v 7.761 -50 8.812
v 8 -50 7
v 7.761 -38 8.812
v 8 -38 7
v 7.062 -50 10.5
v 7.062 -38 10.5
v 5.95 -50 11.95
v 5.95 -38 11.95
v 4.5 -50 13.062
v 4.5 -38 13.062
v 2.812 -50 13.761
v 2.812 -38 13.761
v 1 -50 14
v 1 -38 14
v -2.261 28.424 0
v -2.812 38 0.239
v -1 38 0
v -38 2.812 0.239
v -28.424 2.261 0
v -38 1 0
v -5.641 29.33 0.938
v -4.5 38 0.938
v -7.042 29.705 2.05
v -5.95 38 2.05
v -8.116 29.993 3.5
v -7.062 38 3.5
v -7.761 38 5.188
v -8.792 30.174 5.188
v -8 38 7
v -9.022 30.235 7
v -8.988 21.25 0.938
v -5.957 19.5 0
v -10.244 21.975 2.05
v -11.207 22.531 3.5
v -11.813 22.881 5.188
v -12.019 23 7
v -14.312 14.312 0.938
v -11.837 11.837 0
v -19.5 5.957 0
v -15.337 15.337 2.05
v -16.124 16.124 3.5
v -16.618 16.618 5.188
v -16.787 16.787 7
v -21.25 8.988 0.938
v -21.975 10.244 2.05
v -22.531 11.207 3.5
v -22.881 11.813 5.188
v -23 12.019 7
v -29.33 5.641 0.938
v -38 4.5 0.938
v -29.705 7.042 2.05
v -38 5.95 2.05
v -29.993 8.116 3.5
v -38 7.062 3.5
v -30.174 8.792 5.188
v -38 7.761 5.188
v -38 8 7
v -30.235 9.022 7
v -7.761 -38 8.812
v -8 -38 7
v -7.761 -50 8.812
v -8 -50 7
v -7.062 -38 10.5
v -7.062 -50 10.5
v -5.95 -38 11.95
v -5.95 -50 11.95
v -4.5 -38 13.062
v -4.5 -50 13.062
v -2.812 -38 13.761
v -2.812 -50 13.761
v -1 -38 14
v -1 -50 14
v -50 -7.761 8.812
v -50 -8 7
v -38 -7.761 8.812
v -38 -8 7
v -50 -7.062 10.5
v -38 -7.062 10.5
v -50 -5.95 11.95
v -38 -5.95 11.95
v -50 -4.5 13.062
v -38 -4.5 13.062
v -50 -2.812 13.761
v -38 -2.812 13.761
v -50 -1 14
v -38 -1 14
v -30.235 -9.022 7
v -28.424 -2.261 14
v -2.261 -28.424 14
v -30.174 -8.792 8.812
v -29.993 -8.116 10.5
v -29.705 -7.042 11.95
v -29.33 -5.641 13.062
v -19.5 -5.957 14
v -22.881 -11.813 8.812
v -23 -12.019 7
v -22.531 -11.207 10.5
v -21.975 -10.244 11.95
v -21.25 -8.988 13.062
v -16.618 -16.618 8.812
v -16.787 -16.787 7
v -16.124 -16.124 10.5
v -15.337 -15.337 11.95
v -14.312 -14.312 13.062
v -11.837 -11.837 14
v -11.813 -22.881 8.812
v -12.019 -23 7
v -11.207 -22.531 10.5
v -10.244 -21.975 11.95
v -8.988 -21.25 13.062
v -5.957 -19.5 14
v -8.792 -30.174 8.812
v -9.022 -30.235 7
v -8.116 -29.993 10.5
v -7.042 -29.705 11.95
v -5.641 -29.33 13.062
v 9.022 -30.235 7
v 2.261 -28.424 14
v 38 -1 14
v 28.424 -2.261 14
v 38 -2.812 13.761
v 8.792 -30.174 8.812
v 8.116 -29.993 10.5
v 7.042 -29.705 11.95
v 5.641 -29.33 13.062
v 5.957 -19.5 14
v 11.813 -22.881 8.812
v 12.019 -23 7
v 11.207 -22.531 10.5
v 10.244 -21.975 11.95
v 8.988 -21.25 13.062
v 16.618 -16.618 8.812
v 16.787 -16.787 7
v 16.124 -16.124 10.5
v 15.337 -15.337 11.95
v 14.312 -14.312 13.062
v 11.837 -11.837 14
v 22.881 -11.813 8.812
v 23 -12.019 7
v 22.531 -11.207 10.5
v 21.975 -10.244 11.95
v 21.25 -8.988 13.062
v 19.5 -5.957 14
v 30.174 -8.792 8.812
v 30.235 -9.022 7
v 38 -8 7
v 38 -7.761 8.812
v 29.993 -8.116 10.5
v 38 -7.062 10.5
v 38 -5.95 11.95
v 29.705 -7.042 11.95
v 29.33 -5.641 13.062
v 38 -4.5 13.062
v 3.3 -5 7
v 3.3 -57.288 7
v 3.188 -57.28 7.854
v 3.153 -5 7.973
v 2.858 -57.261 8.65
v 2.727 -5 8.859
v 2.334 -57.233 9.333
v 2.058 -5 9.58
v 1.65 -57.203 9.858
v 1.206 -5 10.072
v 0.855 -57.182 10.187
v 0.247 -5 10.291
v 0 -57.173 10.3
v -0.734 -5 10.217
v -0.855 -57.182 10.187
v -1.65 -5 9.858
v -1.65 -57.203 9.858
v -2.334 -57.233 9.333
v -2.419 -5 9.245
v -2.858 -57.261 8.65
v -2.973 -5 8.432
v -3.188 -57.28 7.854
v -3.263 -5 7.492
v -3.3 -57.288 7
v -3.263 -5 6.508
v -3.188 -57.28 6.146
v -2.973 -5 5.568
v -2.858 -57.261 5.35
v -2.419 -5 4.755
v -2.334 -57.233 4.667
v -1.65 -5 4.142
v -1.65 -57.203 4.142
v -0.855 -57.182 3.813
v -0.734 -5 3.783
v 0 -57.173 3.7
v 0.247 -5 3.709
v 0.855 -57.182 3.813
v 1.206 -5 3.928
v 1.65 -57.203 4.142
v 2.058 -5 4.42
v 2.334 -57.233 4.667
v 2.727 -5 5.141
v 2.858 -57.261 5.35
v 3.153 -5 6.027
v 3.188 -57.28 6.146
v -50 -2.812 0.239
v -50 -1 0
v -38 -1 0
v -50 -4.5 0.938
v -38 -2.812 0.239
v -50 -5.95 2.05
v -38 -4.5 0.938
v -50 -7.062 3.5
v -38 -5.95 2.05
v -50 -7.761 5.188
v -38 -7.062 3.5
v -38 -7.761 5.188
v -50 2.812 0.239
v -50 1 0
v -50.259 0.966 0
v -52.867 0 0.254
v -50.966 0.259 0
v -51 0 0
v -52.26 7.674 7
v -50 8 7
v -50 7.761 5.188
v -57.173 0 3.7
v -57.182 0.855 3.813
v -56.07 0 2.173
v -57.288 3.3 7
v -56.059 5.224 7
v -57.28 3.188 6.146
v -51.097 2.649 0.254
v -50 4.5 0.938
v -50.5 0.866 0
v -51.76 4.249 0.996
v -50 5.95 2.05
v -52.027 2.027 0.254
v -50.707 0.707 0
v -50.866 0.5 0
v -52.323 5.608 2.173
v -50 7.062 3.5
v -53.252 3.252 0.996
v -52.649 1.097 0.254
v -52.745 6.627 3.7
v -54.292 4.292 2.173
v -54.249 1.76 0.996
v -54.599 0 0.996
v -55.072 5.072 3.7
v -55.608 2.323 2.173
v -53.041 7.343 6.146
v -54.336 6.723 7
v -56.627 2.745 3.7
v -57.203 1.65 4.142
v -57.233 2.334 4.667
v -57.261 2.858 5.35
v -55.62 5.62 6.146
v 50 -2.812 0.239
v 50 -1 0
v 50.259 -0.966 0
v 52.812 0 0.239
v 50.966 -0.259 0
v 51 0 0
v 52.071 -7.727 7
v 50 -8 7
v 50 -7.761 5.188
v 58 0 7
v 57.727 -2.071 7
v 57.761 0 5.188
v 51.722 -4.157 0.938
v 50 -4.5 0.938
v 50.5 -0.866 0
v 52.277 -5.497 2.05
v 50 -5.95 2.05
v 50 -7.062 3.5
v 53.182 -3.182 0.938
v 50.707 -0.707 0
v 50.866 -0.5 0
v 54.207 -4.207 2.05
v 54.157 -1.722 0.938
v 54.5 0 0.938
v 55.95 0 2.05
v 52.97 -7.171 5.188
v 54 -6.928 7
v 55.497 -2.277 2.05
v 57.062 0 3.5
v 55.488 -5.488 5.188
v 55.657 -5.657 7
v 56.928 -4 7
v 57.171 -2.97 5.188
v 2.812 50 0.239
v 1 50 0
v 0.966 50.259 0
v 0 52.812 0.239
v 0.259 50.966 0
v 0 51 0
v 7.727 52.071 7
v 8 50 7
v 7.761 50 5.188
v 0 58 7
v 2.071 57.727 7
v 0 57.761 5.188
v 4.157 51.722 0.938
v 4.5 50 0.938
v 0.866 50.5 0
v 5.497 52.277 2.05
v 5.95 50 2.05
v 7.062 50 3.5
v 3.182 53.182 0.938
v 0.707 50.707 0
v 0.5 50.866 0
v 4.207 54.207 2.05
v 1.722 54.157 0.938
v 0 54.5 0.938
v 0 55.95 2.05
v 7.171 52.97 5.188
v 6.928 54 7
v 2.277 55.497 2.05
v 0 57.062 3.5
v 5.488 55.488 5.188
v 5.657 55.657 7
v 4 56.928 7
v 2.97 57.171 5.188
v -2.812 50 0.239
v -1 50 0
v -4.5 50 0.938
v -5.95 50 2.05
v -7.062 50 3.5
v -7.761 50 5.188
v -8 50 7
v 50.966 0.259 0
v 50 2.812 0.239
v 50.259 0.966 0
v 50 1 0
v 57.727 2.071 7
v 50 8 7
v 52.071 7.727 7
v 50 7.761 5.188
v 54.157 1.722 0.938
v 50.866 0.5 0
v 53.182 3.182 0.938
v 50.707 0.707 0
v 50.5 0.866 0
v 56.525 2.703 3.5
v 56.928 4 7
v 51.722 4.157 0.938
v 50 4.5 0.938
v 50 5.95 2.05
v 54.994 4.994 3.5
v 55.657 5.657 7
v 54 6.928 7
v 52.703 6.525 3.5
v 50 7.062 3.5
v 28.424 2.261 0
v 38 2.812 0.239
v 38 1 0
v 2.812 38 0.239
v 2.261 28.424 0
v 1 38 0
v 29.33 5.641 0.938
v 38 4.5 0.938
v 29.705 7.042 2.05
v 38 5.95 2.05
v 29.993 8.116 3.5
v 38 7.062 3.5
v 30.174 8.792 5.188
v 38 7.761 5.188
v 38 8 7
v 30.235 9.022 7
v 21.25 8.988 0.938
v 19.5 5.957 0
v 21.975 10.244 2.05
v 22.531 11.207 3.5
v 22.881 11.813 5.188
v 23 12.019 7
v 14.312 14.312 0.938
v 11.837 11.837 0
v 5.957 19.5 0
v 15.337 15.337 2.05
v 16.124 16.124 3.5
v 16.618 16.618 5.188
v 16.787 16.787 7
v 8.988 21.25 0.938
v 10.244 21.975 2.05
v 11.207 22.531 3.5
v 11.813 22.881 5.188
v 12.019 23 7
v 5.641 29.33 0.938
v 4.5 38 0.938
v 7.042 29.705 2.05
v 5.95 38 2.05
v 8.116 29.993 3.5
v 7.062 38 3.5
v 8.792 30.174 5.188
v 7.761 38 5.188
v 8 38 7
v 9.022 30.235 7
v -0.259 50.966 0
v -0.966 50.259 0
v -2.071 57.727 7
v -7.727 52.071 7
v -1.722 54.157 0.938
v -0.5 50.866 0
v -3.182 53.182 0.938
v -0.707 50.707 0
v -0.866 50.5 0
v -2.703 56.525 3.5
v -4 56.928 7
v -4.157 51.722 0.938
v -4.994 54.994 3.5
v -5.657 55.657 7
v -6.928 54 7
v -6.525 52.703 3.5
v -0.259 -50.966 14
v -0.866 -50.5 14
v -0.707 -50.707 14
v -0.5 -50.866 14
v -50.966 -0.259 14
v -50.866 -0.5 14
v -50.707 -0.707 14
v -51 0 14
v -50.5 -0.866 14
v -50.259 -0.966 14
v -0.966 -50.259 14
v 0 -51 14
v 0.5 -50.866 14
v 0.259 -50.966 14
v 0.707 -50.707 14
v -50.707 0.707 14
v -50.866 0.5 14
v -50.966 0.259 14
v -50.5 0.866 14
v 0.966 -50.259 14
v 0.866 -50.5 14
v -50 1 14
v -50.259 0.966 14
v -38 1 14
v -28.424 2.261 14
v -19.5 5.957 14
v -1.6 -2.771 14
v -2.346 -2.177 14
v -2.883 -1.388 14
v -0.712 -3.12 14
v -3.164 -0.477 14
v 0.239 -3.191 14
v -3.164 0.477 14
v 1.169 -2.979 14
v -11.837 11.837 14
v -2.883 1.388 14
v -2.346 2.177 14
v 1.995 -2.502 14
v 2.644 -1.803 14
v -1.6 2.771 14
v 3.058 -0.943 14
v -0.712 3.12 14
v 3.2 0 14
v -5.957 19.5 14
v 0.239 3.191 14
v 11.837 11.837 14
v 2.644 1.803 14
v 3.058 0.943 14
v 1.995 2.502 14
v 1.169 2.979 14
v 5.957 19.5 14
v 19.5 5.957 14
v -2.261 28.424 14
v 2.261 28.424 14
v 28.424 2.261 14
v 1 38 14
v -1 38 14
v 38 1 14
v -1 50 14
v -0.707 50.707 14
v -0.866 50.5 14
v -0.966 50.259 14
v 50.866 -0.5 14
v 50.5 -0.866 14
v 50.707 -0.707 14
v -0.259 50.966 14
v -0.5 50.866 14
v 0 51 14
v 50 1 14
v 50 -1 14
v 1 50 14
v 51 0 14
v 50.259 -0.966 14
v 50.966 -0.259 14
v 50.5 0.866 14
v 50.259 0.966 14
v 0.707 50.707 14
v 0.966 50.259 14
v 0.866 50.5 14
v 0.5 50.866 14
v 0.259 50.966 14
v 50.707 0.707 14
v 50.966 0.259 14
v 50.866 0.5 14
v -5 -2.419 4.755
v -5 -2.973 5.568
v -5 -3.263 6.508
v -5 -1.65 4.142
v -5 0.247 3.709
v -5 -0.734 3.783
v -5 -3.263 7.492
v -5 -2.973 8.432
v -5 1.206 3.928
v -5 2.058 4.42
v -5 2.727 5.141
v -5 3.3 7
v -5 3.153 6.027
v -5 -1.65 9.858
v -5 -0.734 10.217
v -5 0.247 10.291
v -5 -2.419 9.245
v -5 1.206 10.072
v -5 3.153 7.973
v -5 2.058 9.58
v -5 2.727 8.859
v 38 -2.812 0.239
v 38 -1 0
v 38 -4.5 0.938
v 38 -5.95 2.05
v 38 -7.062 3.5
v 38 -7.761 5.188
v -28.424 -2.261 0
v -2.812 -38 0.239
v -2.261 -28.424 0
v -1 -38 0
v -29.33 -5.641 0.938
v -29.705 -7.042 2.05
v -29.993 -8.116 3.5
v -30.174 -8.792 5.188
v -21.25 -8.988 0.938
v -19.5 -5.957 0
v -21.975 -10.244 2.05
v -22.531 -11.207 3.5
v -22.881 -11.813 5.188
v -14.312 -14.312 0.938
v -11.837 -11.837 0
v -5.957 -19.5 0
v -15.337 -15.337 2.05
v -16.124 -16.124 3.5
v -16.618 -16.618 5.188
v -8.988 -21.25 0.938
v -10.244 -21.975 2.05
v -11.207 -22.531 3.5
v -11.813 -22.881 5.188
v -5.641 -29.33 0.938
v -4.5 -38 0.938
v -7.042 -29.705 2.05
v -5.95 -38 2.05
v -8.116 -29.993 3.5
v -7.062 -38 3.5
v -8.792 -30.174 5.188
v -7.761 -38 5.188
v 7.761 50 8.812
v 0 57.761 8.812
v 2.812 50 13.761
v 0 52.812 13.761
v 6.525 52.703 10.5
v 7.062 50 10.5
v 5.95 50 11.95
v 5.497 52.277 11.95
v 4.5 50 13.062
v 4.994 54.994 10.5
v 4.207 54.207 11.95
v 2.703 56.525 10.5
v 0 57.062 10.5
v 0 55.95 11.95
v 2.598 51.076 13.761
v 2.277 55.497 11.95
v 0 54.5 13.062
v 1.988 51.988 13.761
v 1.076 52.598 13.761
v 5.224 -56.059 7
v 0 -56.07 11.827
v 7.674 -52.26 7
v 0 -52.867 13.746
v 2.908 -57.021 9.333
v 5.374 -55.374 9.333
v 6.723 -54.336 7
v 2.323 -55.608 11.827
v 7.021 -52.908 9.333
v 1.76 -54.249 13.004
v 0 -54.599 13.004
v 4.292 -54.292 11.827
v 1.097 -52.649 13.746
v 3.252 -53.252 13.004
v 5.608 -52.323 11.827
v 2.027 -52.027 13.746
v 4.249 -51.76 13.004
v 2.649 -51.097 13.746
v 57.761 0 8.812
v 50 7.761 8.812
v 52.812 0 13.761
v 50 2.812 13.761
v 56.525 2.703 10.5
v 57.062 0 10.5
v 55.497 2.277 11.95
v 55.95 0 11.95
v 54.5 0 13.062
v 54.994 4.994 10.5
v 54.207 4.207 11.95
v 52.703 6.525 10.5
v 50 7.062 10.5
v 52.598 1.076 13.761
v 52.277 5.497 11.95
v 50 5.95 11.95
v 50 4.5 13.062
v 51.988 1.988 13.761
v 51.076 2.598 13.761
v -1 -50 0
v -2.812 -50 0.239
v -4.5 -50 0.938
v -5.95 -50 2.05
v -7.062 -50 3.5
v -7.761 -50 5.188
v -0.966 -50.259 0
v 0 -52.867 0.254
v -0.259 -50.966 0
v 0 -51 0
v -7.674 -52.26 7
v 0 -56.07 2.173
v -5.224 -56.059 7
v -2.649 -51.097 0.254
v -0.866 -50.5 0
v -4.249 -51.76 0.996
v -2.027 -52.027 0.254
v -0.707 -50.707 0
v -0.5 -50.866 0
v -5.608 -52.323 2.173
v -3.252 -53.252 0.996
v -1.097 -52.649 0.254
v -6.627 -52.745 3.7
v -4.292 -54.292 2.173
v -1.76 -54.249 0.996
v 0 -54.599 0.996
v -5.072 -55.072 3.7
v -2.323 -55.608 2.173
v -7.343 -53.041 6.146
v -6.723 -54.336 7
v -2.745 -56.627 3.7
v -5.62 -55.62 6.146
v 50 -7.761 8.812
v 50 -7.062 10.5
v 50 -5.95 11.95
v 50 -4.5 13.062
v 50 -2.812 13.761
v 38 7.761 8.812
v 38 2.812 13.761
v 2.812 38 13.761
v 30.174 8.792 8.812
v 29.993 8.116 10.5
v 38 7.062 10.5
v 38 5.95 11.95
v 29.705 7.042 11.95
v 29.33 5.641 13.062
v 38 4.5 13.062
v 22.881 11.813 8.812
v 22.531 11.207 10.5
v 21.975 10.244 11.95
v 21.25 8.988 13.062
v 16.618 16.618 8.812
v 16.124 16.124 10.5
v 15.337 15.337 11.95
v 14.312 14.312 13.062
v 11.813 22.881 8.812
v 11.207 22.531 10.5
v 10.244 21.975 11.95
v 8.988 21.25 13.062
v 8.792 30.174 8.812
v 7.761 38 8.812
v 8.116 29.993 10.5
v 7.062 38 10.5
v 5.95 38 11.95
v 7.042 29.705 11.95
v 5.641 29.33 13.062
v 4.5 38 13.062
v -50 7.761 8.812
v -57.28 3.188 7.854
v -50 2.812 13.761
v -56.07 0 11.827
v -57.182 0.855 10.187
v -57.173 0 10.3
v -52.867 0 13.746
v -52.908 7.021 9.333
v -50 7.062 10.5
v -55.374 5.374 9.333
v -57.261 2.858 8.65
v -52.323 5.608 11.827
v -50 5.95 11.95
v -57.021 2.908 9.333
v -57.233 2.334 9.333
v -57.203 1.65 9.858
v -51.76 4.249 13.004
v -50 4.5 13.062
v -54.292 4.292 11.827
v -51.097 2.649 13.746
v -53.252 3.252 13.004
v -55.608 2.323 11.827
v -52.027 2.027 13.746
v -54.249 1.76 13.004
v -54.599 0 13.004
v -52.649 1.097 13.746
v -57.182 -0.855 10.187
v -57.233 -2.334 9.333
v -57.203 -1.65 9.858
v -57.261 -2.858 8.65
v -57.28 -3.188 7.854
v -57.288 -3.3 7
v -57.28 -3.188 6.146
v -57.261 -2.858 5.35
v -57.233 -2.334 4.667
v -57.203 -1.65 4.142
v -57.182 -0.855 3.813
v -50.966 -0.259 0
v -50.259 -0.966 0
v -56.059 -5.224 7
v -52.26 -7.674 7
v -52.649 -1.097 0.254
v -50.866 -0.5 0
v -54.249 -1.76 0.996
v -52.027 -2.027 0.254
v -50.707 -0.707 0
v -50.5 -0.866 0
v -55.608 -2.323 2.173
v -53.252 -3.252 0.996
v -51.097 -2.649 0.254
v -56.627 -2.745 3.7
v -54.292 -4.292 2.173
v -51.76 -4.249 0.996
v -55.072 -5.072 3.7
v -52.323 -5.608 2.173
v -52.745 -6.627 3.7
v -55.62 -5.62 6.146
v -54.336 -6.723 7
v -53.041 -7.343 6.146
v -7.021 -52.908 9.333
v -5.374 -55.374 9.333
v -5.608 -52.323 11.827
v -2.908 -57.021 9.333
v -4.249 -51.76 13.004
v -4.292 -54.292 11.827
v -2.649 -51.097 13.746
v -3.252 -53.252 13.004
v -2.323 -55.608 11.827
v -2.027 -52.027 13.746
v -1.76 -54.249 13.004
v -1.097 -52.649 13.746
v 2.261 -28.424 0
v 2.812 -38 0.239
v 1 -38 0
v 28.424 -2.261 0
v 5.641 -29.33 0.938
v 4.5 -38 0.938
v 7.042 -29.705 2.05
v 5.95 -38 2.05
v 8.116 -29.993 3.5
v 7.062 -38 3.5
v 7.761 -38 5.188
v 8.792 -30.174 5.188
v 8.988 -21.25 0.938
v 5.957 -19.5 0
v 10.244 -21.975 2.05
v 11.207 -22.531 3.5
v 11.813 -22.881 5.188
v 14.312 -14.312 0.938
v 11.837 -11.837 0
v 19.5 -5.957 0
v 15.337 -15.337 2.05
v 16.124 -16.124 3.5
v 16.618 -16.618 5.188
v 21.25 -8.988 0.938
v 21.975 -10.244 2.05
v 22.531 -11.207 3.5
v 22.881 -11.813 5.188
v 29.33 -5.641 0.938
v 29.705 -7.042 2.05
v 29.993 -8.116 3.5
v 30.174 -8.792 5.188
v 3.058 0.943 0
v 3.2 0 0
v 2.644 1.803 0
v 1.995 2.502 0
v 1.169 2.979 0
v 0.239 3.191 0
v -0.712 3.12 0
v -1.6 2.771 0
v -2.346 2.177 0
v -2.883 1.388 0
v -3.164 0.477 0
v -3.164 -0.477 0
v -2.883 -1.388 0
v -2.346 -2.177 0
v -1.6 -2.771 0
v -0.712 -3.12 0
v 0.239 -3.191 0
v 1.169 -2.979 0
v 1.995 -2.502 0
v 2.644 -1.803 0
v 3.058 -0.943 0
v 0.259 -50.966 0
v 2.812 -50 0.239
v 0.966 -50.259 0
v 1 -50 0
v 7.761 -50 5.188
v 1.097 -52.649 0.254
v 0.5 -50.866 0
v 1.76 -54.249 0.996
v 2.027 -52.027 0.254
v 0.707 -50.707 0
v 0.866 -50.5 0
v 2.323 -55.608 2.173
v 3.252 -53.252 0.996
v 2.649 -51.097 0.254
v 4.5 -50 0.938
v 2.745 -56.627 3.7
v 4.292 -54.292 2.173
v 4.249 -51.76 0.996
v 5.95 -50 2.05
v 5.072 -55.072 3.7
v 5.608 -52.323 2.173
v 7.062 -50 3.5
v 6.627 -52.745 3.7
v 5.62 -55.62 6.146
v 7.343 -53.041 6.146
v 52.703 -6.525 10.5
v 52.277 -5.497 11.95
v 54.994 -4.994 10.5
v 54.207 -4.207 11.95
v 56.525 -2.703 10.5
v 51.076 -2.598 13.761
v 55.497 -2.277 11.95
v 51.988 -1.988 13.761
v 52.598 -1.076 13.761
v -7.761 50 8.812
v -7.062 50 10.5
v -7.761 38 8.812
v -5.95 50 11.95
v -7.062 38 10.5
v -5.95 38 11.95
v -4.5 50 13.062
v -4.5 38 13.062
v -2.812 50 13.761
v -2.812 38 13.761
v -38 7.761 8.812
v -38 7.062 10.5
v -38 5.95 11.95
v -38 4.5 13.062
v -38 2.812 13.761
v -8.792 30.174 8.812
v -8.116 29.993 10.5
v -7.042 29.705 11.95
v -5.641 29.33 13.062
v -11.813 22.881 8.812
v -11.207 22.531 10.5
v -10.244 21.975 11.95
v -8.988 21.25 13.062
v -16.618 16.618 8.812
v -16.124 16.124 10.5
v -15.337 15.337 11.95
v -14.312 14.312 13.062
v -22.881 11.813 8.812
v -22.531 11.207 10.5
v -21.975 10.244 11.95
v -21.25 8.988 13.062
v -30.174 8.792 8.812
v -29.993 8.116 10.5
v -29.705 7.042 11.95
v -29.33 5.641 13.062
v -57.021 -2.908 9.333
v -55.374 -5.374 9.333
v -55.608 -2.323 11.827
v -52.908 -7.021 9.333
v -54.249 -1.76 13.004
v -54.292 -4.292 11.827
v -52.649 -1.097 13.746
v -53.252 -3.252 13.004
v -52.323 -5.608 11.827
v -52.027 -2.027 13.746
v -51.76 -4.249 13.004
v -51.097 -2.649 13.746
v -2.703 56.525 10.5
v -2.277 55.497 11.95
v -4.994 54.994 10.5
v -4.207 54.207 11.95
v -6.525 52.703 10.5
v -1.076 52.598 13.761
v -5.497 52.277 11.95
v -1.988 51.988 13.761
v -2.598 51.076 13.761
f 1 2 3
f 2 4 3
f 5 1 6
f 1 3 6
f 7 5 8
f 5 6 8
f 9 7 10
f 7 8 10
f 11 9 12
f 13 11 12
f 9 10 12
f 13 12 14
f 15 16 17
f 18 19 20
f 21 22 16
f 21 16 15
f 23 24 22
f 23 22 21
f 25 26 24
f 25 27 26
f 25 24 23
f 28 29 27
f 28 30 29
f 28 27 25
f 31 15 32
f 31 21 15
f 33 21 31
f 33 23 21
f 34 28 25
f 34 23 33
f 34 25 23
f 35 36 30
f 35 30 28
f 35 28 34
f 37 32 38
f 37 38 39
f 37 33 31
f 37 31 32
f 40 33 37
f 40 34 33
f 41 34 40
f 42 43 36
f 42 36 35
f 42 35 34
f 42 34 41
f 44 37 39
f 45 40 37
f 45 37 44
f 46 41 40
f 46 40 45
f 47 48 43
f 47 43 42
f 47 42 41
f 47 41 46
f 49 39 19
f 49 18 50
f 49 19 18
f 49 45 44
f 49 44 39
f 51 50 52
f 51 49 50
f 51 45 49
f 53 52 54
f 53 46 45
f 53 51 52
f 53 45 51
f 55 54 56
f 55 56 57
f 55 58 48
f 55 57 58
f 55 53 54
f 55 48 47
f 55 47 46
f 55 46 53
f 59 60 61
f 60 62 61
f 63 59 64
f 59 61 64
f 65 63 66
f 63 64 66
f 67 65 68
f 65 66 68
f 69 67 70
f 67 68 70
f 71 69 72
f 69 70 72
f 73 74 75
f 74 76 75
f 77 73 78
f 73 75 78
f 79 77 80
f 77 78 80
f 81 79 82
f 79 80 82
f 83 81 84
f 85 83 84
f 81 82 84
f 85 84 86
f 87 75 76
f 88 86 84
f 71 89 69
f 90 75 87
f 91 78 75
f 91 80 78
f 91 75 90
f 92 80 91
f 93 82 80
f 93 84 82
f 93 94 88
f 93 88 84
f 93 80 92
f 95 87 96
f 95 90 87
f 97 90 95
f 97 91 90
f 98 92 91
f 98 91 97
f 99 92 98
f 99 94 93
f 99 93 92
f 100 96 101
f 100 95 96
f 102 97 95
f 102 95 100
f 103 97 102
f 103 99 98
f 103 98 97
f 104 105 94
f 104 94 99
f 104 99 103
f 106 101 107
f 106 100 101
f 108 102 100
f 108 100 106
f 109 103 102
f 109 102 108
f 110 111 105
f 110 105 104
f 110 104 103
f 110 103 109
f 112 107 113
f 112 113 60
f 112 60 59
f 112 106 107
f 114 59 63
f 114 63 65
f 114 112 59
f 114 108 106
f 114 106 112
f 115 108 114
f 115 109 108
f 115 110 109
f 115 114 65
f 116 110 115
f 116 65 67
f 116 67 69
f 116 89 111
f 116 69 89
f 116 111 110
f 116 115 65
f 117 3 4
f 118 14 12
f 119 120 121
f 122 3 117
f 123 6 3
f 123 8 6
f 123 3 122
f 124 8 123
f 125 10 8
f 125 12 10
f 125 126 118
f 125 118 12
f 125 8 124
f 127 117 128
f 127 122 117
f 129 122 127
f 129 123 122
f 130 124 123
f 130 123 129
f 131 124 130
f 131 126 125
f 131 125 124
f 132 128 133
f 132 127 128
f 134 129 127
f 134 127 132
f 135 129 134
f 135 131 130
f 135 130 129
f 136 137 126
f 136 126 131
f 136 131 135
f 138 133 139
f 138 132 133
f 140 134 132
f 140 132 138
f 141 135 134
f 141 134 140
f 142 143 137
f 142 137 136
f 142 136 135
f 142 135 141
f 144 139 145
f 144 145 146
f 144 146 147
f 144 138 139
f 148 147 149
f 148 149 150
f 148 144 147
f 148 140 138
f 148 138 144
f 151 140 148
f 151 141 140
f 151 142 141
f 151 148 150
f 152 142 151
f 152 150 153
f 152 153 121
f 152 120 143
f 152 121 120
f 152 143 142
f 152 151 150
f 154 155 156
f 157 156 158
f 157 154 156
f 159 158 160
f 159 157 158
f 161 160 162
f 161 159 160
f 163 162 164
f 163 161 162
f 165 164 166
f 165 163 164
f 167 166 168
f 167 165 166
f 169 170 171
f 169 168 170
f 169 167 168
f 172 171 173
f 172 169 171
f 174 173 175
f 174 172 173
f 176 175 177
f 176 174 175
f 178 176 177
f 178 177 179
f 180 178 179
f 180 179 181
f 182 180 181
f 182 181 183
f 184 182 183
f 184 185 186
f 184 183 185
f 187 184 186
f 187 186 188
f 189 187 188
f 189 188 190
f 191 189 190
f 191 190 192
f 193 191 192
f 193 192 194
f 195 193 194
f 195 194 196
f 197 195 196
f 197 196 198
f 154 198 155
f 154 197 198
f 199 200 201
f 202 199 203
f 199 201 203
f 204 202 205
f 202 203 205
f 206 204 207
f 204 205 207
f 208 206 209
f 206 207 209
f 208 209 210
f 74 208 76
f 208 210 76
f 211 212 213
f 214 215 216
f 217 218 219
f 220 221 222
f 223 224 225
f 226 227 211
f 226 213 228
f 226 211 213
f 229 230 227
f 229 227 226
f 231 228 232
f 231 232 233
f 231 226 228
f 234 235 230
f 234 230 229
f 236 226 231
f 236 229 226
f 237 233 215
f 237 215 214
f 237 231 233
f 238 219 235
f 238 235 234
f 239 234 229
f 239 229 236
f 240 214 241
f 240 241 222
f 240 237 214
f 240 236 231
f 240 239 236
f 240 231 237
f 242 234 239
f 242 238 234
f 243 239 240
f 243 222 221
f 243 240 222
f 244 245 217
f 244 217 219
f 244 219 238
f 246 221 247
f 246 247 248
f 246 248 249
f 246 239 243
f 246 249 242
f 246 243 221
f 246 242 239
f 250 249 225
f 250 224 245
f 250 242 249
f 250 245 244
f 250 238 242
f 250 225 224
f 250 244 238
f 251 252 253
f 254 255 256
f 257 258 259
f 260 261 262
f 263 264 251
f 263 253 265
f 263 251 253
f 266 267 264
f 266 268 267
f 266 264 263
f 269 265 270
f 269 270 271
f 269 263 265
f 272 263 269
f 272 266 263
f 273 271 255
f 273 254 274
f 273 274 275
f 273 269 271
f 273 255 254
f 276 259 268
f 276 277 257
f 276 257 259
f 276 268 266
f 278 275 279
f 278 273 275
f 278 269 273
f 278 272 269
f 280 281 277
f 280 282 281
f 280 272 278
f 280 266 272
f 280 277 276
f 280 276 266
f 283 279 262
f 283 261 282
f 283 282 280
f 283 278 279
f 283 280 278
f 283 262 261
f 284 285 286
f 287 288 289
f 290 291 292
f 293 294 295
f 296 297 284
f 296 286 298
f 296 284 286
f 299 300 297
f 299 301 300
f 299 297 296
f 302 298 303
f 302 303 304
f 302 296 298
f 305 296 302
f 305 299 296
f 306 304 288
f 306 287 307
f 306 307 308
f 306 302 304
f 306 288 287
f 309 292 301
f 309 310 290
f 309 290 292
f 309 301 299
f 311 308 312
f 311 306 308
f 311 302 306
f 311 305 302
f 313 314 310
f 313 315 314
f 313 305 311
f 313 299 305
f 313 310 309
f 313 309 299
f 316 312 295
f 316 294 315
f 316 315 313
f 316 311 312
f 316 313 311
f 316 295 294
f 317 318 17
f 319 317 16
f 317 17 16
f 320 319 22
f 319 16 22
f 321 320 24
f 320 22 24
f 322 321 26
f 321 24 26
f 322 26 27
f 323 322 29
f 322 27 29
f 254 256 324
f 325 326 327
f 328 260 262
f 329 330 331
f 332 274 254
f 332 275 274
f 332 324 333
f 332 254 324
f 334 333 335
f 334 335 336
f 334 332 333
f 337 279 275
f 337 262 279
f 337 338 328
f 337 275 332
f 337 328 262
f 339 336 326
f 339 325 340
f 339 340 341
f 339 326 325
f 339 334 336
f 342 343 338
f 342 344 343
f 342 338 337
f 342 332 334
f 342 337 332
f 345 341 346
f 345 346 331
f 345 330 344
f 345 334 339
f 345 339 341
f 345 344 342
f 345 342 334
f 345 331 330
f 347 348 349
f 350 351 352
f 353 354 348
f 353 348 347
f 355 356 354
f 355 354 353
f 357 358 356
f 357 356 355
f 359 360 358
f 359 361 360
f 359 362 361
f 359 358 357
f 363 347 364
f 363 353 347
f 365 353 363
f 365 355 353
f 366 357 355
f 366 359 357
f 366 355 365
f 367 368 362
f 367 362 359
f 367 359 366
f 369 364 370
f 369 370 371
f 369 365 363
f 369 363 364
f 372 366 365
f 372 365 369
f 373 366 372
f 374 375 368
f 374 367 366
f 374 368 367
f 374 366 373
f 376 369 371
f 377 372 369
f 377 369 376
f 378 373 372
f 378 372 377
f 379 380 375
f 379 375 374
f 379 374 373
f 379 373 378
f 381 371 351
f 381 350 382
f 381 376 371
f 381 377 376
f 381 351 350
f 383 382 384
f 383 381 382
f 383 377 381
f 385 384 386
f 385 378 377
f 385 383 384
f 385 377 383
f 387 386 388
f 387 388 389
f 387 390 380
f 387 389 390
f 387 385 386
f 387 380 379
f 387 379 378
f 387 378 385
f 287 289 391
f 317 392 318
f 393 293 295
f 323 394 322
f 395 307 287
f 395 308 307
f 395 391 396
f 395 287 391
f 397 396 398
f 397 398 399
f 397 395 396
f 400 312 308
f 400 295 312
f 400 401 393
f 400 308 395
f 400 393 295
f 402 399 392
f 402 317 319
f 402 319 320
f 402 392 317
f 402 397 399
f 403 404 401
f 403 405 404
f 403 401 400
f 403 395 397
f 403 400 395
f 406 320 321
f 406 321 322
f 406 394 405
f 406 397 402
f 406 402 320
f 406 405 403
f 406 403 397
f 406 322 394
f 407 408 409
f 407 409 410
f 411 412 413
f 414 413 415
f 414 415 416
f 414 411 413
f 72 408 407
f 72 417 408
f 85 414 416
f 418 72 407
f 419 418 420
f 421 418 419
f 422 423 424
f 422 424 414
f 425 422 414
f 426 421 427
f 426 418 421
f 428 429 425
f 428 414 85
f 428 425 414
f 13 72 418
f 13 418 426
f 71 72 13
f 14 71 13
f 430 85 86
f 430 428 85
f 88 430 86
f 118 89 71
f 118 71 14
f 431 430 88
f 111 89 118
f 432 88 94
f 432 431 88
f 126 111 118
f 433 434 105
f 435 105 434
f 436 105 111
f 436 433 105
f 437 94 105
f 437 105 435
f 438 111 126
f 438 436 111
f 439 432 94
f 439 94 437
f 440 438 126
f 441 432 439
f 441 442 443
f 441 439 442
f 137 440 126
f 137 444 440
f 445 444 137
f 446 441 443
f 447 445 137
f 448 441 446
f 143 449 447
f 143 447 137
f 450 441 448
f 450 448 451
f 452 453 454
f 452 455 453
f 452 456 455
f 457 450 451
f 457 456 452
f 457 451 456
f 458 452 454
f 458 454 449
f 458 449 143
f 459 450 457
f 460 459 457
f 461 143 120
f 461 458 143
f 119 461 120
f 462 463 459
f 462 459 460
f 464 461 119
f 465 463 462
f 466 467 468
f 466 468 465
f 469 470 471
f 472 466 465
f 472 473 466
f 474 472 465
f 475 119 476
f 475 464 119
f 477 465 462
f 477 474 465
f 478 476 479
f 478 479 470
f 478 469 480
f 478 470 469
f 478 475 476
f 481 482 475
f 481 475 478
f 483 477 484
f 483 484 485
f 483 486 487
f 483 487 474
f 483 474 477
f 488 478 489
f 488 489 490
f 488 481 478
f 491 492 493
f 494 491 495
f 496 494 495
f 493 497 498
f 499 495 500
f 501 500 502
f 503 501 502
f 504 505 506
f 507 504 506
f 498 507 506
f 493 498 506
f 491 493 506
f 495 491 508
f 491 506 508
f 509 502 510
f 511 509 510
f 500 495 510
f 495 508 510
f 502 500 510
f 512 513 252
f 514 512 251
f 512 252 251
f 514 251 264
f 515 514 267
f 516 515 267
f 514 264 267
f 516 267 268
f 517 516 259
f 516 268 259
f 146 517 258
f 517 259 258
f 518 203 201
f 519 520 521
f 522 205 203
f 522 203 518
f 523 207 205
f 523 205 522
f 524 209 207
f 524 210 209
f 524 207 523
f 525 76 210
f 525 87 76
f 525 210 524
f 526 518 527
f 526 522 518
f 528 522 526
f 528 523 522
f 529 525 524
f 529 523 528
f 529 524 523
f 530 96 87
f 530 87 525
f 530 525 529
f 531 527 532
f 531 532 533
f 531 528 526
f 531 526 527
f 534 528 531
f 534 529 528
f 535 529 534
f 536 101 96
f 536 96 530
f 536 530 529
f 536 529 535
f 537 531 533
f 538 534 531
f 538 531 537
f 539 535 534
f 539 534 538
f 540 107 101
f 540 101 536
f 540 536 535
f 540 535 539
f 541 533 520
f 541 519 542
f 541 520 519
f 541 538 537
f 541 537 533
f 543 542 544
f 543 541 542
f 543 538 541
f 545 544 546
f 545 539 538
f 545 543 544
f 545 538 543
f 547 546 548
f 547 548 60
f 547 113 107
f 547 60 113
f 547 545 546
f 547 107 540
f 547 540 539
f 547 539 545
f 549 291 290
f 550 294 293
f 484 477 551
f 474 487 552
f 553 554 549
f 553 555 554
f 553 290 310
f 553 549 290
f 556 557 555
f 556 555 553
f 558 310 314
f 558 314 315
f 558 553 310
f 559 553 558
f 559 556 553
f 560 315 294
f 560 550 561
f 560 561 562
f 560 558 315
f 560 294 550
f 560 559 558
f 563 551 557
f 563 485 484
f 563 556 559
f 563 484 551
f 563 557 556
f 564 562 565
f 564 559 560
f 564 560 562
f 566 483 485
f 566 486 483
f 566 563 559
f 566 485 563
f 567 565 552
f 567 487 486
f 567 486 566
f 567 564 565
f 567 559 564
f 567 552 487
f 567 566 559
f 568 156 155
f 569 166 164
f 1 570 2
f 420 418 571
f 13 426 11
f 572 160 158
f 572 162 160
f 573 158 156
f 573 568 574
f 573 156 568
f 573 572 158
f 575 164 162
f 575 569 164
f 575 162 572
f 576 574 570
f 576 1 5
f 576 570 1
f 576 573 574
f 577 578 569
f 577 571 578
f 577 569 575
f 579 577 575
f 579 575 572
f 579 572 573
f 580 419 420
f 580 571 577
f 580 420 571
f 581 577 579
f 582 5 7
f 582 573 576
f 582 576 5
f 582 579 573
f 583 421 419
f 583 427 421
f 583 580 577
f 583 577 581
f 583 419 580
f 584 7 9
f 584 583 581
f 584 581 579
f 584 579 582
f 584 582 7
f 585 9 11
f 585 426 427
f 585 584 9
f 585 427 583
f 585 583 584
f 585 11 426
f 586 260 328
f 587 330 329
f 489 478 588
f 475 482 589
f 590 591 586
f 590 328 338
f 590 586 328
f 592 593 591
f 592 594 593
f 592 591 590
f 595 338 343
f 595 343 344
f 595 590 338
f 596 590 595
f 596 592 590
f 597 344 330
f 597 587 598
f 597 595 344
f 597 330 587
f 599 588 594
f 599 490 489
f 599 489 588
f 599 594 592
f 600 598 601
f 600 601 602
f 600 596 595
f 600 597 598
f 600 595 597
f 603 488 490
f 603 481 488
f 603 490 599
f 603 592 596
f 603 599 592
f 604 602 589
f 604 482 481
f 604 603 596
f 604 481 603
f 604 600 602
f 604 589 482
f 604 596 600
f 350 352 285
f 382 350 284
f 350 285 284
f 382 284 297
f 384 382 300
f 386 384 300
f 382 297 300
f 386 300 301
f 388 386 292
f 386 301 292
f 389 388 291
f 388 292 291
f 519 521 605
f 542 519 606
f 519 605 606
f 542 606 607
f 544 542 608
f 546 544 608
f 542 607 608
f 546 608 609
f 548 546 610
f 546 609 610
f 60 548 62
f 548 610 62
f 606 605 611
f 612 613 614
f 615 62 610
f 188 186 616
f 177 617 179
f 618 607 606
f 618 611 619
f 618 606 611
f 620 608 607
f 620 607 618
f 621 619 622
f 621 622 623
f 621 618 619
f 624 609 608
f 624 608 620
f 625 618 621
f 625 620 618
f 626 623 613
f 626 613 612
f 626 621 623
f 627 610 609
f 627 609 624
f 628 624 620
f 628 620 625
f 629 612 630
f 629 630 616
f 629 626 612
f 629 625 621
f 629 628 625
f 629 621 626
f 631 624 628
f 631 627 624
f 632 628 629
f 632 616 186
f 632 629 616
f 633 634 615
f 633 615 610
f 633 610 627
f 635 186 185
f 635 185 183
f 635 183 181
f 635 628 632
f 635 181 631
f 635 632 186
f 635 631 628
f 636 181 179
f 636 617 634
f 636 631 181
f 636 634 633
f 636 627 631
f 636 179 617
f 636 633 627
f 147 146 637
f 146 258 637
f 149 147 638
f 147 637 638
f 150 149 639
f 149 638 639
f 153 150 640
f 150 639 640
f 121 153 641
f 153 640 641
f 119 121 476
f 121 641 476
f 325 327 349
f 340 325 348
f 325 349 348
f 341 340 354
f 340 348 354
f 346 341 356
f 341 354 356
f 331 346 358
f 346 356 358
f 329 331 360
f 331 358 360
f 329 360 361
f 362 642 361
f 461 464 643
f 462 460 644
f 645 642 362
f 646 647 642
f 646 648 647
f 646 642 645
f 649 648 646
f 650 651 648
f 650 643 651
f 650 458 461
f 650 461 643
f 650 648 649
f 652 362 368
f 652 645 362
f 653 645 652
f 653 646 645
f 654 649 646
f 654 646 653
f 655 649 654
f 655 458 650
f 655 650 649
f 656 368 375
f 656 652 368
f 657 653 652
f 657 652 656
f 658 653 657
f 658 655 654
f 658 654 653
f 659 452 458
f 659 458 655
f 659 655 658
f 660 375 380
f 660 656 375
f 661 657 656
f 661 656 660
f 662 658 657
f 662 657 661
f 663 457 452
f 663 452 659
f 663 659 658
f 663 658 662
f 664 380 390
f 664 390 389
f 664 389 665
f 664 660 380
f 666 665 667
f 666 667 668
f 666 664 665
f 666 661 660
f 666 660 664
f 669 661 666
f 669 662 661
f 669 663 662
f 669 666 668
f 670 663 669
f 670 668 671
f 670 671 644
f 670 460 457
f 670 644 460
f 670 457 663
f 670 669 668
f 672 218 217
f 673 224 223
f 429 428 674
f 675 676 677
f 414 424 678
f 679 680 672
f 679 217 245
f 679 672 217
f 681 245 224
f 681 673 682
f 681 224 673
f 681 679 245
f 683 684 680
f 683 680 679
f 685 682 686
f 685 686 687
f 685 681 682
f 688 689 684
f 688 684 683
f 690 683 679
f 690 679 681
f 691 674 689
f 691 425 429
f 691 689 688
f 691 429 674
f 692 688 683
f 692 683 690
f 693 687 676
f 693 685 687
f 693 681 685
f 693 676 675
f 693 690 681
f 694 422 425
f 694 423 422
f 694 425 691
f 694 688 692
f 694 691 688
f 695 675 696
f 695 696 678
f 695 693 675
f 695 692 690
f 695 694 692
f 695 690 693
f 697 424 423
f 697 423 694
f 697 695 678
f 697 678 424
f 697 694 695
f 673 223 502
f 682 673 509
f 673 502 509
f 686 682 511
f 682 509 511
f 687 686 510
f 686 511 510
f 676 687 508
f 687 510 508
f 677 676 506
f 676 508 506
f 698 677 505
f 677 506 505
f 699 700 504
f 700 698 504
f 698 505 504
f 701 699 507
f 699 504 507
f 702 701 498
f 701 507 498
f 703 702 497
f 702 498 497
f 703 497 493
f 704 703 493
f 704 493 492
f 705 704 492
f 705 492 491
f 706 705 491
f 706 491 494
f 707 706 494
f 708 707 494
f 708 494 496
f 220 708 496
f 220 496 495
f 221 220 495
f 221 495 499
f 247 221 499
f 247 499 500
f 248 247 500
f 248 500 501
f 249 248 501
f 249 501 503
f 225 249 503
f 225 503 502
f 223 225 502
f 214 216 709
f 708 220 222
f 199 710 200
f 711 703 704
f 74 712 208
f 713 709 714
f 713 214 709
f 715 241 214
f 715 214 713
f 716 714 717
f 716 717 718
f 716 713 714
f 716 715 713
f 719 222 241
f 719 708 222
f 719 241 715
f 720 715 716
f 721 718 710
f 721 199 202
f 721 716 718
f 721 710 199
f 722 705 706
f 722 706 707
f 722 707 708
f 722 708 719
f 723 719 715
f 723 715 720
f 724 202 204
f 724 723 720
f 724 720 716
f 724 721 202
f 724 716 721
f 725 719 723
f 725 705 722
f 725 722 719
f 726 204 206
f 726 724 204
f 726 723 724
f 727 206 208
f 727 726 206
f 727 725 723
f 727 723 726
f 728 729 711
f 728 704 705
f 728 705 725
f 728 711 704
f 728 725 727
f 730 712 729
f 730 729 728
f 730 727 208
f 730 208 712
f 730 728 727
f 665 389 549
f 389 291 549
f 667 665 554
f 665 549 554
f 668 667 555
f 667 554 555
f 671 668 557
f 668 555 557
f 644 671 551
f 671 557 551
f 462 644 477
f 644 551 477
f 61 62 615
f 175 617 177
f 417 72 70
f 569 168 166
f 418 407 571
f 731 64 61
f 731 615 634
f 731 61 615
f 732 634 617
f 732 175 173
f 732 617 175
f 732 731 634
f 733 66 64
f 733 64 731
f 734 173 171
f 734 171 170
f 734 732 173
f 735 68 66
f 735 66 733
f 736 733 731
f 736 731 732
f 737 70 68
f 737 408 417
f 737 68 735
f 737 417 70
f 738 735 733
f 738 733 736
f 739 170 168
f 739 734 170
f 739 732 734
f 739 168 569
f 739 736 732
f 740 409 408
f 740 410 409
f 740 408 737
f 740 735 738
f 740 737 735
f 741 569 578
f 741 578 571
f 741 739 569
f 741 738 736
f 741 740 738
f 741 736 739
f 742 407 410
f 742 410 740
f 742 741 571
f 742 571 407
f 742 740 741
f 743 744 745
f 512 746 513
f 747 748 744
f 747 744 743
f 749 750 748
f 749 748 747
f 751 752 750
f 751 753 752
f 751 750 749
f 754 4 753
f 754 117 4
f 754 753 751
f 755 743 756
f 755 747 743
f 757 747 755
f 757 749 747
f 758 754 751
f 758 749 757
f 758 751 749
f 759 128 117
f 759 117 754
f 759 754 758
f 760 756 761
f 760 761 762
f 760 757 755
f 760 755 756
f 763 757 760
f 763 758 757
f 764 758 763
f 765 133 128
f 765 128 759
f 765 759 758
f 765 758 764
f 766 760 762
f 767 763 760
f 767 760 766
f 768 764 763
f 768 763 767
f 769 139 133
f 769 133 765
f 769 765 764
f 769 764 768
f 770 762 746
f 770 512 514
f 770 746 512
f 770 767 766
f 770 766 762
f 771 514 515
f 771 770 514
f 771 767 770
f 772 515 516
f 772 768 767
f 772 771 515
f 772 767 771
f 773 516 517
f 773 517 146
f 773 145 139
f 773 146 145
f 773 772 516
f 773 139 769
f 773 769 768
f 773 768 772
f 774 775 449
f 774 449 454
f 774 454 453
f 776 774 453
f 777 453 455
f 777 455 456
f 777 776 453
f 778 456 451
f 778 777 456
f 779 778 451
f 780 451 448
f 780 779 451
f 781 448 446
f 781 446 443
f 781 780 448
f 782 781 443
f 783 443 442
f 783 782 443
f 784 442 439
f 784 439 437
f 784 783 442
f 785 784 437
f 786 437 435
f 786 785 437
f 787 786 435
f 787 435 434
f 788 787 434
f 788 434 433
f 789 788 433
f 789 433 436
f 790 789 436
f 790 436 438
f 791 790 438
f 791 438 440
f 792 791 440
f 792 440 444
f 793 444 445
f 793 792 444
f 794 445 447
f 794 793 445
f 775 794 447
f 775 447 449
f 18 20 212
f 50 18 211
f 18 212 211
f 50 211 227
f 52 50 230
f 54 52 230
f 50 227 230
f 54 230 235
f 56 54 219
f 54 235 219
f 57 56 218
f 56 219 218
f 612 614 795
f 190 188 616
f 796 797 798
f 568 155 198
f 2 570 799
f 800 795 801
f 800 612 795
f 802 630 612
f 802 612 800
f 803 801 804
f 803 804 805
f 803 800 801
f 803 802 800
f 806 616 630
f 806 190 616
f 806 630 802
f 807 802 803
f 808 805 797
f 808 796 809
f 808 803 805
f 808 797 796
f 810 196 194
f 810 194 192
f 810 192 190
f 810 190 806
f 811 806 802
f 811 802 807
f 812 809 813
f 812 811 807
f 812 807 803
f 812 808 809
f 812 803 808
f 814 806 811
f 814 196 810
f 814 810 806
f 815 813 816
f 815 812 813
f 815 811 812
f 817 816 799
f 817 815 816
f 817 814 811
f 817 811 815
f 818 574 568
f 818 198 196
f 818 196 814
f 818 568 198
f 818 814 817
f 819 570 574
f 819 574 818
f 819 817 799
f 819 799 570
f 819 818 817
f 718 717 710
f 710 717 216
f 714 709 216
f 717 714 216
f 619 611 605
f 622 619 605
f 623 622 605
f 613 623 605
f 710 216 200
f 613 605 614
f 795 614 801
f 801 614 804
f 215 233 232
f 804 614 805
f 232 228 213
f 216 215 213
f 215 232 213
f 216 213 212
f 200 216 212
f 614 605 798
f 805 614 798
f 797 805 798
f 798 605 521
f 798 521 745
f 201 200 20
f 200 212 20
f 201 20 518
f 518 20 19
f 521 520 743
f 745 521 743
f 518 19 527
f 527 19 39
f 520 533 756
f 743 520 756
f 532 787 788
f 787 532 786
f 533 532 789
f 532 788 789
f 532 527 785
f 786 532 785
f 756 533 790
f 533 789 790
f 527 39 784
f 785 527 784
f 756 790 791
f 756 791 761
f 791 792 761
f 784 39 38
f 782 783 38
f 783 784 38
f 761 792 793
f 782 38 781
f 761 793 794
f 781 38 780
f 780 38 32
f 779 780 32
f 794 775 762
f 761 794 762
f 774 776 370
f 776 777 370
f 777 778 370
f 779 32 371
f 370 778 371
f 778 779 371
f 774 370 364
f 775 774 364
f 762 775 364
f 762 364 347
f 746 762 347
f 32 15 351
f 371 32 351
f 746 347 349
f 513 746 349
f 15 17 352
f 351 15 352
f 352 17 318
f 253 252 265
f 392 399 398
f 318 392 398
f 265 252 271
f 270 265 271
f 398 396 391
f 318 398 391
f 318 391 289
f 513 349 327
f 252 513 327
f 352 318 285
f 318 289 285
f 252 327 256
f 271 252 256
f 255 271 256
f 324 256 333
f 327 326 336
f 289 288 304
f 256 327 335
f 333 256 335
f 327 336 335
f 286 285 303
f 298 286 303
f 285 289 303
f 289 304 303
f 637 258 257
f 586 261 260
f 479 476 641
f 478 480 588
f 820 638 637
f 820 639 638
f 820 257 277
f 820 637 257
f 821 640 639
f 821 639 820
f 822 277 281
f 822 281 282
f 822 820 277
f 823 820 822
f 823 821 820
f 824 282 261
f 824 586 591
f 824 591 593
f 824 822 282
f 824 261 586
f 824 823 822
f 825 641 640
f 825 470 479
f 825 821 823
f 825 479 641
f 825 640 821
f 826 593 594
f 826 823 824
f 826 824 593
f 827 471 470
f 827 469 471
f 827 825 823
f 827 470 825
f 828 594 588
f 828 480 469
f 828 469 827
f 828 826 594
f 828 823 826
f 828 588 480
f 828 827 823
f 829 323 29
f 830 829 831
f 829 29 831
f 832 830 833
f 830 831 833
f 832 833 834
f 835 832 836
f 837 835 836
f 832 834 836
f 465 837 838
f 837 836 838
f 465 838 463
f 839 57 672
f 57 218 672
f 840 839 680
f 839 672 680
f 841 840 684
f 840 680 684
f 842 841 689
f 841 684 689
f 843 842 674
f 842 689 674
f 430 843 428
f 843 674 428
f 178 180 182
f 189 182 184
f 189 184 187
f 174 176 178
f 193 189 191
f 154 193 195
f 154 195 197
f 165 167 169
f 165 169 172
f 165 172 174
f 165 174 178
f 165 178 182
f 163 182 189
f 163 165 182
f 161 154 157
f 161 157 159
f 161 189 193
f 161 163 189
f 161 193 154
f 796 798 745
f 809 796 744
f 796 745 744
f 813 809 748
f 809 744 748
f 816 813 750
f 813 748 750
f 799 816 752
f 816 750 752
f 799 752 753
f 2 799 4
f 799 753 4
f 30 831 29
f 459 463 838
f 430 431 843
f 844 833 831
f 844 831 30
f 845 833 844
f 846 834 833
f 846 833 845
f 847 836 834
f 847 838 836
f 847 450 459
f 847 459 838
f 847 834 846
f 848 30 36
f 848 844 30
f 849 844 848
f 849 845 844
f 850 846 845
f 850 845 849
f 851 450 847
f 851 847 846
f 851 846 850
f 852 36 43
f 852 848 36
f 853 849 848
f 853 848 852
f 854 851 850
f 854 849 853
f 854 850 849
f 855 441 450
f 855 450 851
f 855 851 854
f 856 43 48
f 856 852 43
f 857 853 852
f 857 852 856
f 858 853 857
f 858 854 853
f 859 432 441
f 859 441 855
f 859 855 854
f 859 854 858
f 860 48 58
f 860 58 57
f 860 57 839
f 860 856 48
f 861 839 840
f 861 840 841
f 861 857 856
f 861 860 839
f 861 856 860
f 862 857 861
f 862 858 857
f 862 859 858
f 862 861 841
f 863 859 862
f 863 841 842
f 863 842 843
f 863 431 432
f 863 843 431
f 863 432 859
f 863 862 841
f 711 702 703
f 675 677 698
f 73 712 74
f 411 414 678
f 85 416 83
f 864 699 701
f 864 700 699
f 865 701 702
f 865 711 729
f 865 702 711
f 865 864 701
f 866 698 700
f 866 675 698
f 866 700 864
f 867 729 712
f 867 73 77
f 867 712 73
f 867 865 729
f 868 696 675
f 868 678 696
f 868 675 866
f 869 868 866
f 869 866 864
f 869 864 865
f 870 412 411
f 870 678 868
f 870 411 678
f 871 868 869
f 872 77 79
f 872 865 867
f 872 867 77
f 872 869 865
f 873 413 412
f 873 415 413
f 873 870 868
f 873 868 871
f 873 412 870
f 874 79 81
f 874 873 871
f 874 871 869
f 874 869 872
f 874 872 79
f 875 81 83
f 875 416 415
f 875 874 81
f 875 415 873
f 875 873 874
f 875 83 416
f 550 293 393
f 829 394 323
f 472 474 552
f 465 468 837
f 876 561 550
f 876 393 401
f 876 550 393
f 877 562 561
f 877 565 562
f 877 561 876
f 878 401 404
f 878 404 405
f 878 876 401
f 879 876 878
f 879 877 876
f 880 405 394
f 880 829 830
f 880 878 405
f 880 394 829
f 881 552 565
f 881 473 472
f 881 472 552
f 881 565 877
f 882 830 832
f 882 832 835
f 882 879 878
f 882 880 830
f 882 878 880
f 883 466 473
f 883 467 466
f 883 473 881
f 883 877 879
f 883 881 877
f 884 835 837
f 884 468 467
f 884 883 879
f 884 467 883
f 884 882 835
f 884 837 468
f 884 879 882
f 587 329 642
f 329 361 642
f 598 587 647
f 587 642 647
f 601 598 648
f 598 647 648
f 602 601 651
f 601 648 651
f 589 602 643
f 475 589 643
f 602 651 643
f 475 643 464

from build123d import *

# Parameters (mm, degrees)
F0_R     = 3.2
F1_DEPTH = 14
F2_R     = 7
F3_R     = 6.99999
F5_START = 5
F4_R     = 3.3
F5_DEPTH = 60
F7_START = -5
F6_R     = 3.3
F7_DEPTH = 60


# Not quite as in the source:
# - a fillet or chamfer is up to 0.001 mm smaller than in the source, because OpenCascade refuses the exact size


with BuildPart() as f1:
    # F0 (on Top) → F1 (new body)
    with BuildSketch(Plane.XY):
        with BuildLine():
            ThreePointArc((0, 58), (-5.6568542495, 55.6568542495), (-8, 50))
            Line((-8, 50), (-8, 38))
            ThreePointArc((-8, 38), (-16.7867965644, 16.7867965644), (-38, 8))
            Line((-38, 8), (-50, 8))
            ThreePointArc((-50, 8), (-55.6568542495, 5.6568542495), (-58, 0))
            ThreePointArc((-58, 0), (-55.6568542495, -5.6568542495), (-50, -8))
            Line((-50, -8), (-38, -8))
            ThreePointArc((-38, -8), (-16.7867965644, -16.7867965644), (-8, -38))
            Line((-8, -38), (-8, -50))
            ThreePointArc((-8, -50), (-5.6568542495, -55.6568542495), (0, -58))
            ThreePointArc((0, -58), (5.6568542495, -55.6568542495), (8, -50))
            Line((8, -50), (8, -38))
            ThreePointArc((8, -38), (16.7867965644, -16.7867965644), (38, -8))
            Line((38, -8), (50, -8))
            ThreePointArc((50, -8), (55.6568542495, -5.6568542495), (58, 0))
            ThreePointArc((58, 0), (55.6568542495, 5.6568542495), (50, 8))
            Line((50, 8), (38, 8))
            ThreePointArc((38, 8), (16.7867965644, 16.7867965644), (8, 38))
            Line((8, 38), (8, 50))
            ThreePointArc((8, 50), (5.6568542495, 55.6568542495), (0, 58))
        make_face()
        Circle(F0_R, mode=Mode.SUBTRACT)
    extrude(amount=F1_DEPTH)

    # F2
    f2_edges = [f1.edges().sort_by_distance(p)[0] for p in [
        (-16.786797, 16.786797, 14),
    ]]
    fillet(f2_edges, radius=F2_R)

    # F3 (radius 7 in the source; OpenCascade refuses exactly that, so slightly less here)
    f3_edges = [f1.edges().sort_by_distance(p)[0] for p in [
        (16.786797, 16.786797, 0),
    ]]
    fillet(f3_edges, radius=F3_R)

    # F4 (on Front) → F5 (cut)
    with BuildSketch(Plane.XZ.offset(F5_START)):
        with Locations((0, 7)):
            Circle(F4_R)
    extrude(amount=F5_DEPTH, mode=Mode.SUBTRACT)

    # F6 (on Right) → F7 (cut)
    with BuildSketch(Plane.YZ.offset(F7_START)):
        with Locations((0, 7)):
            Circle(F6_R)
    extrude(amount=-F7_DEPTH, mode=Mode.SUBTRACT)


solid = f1.part
